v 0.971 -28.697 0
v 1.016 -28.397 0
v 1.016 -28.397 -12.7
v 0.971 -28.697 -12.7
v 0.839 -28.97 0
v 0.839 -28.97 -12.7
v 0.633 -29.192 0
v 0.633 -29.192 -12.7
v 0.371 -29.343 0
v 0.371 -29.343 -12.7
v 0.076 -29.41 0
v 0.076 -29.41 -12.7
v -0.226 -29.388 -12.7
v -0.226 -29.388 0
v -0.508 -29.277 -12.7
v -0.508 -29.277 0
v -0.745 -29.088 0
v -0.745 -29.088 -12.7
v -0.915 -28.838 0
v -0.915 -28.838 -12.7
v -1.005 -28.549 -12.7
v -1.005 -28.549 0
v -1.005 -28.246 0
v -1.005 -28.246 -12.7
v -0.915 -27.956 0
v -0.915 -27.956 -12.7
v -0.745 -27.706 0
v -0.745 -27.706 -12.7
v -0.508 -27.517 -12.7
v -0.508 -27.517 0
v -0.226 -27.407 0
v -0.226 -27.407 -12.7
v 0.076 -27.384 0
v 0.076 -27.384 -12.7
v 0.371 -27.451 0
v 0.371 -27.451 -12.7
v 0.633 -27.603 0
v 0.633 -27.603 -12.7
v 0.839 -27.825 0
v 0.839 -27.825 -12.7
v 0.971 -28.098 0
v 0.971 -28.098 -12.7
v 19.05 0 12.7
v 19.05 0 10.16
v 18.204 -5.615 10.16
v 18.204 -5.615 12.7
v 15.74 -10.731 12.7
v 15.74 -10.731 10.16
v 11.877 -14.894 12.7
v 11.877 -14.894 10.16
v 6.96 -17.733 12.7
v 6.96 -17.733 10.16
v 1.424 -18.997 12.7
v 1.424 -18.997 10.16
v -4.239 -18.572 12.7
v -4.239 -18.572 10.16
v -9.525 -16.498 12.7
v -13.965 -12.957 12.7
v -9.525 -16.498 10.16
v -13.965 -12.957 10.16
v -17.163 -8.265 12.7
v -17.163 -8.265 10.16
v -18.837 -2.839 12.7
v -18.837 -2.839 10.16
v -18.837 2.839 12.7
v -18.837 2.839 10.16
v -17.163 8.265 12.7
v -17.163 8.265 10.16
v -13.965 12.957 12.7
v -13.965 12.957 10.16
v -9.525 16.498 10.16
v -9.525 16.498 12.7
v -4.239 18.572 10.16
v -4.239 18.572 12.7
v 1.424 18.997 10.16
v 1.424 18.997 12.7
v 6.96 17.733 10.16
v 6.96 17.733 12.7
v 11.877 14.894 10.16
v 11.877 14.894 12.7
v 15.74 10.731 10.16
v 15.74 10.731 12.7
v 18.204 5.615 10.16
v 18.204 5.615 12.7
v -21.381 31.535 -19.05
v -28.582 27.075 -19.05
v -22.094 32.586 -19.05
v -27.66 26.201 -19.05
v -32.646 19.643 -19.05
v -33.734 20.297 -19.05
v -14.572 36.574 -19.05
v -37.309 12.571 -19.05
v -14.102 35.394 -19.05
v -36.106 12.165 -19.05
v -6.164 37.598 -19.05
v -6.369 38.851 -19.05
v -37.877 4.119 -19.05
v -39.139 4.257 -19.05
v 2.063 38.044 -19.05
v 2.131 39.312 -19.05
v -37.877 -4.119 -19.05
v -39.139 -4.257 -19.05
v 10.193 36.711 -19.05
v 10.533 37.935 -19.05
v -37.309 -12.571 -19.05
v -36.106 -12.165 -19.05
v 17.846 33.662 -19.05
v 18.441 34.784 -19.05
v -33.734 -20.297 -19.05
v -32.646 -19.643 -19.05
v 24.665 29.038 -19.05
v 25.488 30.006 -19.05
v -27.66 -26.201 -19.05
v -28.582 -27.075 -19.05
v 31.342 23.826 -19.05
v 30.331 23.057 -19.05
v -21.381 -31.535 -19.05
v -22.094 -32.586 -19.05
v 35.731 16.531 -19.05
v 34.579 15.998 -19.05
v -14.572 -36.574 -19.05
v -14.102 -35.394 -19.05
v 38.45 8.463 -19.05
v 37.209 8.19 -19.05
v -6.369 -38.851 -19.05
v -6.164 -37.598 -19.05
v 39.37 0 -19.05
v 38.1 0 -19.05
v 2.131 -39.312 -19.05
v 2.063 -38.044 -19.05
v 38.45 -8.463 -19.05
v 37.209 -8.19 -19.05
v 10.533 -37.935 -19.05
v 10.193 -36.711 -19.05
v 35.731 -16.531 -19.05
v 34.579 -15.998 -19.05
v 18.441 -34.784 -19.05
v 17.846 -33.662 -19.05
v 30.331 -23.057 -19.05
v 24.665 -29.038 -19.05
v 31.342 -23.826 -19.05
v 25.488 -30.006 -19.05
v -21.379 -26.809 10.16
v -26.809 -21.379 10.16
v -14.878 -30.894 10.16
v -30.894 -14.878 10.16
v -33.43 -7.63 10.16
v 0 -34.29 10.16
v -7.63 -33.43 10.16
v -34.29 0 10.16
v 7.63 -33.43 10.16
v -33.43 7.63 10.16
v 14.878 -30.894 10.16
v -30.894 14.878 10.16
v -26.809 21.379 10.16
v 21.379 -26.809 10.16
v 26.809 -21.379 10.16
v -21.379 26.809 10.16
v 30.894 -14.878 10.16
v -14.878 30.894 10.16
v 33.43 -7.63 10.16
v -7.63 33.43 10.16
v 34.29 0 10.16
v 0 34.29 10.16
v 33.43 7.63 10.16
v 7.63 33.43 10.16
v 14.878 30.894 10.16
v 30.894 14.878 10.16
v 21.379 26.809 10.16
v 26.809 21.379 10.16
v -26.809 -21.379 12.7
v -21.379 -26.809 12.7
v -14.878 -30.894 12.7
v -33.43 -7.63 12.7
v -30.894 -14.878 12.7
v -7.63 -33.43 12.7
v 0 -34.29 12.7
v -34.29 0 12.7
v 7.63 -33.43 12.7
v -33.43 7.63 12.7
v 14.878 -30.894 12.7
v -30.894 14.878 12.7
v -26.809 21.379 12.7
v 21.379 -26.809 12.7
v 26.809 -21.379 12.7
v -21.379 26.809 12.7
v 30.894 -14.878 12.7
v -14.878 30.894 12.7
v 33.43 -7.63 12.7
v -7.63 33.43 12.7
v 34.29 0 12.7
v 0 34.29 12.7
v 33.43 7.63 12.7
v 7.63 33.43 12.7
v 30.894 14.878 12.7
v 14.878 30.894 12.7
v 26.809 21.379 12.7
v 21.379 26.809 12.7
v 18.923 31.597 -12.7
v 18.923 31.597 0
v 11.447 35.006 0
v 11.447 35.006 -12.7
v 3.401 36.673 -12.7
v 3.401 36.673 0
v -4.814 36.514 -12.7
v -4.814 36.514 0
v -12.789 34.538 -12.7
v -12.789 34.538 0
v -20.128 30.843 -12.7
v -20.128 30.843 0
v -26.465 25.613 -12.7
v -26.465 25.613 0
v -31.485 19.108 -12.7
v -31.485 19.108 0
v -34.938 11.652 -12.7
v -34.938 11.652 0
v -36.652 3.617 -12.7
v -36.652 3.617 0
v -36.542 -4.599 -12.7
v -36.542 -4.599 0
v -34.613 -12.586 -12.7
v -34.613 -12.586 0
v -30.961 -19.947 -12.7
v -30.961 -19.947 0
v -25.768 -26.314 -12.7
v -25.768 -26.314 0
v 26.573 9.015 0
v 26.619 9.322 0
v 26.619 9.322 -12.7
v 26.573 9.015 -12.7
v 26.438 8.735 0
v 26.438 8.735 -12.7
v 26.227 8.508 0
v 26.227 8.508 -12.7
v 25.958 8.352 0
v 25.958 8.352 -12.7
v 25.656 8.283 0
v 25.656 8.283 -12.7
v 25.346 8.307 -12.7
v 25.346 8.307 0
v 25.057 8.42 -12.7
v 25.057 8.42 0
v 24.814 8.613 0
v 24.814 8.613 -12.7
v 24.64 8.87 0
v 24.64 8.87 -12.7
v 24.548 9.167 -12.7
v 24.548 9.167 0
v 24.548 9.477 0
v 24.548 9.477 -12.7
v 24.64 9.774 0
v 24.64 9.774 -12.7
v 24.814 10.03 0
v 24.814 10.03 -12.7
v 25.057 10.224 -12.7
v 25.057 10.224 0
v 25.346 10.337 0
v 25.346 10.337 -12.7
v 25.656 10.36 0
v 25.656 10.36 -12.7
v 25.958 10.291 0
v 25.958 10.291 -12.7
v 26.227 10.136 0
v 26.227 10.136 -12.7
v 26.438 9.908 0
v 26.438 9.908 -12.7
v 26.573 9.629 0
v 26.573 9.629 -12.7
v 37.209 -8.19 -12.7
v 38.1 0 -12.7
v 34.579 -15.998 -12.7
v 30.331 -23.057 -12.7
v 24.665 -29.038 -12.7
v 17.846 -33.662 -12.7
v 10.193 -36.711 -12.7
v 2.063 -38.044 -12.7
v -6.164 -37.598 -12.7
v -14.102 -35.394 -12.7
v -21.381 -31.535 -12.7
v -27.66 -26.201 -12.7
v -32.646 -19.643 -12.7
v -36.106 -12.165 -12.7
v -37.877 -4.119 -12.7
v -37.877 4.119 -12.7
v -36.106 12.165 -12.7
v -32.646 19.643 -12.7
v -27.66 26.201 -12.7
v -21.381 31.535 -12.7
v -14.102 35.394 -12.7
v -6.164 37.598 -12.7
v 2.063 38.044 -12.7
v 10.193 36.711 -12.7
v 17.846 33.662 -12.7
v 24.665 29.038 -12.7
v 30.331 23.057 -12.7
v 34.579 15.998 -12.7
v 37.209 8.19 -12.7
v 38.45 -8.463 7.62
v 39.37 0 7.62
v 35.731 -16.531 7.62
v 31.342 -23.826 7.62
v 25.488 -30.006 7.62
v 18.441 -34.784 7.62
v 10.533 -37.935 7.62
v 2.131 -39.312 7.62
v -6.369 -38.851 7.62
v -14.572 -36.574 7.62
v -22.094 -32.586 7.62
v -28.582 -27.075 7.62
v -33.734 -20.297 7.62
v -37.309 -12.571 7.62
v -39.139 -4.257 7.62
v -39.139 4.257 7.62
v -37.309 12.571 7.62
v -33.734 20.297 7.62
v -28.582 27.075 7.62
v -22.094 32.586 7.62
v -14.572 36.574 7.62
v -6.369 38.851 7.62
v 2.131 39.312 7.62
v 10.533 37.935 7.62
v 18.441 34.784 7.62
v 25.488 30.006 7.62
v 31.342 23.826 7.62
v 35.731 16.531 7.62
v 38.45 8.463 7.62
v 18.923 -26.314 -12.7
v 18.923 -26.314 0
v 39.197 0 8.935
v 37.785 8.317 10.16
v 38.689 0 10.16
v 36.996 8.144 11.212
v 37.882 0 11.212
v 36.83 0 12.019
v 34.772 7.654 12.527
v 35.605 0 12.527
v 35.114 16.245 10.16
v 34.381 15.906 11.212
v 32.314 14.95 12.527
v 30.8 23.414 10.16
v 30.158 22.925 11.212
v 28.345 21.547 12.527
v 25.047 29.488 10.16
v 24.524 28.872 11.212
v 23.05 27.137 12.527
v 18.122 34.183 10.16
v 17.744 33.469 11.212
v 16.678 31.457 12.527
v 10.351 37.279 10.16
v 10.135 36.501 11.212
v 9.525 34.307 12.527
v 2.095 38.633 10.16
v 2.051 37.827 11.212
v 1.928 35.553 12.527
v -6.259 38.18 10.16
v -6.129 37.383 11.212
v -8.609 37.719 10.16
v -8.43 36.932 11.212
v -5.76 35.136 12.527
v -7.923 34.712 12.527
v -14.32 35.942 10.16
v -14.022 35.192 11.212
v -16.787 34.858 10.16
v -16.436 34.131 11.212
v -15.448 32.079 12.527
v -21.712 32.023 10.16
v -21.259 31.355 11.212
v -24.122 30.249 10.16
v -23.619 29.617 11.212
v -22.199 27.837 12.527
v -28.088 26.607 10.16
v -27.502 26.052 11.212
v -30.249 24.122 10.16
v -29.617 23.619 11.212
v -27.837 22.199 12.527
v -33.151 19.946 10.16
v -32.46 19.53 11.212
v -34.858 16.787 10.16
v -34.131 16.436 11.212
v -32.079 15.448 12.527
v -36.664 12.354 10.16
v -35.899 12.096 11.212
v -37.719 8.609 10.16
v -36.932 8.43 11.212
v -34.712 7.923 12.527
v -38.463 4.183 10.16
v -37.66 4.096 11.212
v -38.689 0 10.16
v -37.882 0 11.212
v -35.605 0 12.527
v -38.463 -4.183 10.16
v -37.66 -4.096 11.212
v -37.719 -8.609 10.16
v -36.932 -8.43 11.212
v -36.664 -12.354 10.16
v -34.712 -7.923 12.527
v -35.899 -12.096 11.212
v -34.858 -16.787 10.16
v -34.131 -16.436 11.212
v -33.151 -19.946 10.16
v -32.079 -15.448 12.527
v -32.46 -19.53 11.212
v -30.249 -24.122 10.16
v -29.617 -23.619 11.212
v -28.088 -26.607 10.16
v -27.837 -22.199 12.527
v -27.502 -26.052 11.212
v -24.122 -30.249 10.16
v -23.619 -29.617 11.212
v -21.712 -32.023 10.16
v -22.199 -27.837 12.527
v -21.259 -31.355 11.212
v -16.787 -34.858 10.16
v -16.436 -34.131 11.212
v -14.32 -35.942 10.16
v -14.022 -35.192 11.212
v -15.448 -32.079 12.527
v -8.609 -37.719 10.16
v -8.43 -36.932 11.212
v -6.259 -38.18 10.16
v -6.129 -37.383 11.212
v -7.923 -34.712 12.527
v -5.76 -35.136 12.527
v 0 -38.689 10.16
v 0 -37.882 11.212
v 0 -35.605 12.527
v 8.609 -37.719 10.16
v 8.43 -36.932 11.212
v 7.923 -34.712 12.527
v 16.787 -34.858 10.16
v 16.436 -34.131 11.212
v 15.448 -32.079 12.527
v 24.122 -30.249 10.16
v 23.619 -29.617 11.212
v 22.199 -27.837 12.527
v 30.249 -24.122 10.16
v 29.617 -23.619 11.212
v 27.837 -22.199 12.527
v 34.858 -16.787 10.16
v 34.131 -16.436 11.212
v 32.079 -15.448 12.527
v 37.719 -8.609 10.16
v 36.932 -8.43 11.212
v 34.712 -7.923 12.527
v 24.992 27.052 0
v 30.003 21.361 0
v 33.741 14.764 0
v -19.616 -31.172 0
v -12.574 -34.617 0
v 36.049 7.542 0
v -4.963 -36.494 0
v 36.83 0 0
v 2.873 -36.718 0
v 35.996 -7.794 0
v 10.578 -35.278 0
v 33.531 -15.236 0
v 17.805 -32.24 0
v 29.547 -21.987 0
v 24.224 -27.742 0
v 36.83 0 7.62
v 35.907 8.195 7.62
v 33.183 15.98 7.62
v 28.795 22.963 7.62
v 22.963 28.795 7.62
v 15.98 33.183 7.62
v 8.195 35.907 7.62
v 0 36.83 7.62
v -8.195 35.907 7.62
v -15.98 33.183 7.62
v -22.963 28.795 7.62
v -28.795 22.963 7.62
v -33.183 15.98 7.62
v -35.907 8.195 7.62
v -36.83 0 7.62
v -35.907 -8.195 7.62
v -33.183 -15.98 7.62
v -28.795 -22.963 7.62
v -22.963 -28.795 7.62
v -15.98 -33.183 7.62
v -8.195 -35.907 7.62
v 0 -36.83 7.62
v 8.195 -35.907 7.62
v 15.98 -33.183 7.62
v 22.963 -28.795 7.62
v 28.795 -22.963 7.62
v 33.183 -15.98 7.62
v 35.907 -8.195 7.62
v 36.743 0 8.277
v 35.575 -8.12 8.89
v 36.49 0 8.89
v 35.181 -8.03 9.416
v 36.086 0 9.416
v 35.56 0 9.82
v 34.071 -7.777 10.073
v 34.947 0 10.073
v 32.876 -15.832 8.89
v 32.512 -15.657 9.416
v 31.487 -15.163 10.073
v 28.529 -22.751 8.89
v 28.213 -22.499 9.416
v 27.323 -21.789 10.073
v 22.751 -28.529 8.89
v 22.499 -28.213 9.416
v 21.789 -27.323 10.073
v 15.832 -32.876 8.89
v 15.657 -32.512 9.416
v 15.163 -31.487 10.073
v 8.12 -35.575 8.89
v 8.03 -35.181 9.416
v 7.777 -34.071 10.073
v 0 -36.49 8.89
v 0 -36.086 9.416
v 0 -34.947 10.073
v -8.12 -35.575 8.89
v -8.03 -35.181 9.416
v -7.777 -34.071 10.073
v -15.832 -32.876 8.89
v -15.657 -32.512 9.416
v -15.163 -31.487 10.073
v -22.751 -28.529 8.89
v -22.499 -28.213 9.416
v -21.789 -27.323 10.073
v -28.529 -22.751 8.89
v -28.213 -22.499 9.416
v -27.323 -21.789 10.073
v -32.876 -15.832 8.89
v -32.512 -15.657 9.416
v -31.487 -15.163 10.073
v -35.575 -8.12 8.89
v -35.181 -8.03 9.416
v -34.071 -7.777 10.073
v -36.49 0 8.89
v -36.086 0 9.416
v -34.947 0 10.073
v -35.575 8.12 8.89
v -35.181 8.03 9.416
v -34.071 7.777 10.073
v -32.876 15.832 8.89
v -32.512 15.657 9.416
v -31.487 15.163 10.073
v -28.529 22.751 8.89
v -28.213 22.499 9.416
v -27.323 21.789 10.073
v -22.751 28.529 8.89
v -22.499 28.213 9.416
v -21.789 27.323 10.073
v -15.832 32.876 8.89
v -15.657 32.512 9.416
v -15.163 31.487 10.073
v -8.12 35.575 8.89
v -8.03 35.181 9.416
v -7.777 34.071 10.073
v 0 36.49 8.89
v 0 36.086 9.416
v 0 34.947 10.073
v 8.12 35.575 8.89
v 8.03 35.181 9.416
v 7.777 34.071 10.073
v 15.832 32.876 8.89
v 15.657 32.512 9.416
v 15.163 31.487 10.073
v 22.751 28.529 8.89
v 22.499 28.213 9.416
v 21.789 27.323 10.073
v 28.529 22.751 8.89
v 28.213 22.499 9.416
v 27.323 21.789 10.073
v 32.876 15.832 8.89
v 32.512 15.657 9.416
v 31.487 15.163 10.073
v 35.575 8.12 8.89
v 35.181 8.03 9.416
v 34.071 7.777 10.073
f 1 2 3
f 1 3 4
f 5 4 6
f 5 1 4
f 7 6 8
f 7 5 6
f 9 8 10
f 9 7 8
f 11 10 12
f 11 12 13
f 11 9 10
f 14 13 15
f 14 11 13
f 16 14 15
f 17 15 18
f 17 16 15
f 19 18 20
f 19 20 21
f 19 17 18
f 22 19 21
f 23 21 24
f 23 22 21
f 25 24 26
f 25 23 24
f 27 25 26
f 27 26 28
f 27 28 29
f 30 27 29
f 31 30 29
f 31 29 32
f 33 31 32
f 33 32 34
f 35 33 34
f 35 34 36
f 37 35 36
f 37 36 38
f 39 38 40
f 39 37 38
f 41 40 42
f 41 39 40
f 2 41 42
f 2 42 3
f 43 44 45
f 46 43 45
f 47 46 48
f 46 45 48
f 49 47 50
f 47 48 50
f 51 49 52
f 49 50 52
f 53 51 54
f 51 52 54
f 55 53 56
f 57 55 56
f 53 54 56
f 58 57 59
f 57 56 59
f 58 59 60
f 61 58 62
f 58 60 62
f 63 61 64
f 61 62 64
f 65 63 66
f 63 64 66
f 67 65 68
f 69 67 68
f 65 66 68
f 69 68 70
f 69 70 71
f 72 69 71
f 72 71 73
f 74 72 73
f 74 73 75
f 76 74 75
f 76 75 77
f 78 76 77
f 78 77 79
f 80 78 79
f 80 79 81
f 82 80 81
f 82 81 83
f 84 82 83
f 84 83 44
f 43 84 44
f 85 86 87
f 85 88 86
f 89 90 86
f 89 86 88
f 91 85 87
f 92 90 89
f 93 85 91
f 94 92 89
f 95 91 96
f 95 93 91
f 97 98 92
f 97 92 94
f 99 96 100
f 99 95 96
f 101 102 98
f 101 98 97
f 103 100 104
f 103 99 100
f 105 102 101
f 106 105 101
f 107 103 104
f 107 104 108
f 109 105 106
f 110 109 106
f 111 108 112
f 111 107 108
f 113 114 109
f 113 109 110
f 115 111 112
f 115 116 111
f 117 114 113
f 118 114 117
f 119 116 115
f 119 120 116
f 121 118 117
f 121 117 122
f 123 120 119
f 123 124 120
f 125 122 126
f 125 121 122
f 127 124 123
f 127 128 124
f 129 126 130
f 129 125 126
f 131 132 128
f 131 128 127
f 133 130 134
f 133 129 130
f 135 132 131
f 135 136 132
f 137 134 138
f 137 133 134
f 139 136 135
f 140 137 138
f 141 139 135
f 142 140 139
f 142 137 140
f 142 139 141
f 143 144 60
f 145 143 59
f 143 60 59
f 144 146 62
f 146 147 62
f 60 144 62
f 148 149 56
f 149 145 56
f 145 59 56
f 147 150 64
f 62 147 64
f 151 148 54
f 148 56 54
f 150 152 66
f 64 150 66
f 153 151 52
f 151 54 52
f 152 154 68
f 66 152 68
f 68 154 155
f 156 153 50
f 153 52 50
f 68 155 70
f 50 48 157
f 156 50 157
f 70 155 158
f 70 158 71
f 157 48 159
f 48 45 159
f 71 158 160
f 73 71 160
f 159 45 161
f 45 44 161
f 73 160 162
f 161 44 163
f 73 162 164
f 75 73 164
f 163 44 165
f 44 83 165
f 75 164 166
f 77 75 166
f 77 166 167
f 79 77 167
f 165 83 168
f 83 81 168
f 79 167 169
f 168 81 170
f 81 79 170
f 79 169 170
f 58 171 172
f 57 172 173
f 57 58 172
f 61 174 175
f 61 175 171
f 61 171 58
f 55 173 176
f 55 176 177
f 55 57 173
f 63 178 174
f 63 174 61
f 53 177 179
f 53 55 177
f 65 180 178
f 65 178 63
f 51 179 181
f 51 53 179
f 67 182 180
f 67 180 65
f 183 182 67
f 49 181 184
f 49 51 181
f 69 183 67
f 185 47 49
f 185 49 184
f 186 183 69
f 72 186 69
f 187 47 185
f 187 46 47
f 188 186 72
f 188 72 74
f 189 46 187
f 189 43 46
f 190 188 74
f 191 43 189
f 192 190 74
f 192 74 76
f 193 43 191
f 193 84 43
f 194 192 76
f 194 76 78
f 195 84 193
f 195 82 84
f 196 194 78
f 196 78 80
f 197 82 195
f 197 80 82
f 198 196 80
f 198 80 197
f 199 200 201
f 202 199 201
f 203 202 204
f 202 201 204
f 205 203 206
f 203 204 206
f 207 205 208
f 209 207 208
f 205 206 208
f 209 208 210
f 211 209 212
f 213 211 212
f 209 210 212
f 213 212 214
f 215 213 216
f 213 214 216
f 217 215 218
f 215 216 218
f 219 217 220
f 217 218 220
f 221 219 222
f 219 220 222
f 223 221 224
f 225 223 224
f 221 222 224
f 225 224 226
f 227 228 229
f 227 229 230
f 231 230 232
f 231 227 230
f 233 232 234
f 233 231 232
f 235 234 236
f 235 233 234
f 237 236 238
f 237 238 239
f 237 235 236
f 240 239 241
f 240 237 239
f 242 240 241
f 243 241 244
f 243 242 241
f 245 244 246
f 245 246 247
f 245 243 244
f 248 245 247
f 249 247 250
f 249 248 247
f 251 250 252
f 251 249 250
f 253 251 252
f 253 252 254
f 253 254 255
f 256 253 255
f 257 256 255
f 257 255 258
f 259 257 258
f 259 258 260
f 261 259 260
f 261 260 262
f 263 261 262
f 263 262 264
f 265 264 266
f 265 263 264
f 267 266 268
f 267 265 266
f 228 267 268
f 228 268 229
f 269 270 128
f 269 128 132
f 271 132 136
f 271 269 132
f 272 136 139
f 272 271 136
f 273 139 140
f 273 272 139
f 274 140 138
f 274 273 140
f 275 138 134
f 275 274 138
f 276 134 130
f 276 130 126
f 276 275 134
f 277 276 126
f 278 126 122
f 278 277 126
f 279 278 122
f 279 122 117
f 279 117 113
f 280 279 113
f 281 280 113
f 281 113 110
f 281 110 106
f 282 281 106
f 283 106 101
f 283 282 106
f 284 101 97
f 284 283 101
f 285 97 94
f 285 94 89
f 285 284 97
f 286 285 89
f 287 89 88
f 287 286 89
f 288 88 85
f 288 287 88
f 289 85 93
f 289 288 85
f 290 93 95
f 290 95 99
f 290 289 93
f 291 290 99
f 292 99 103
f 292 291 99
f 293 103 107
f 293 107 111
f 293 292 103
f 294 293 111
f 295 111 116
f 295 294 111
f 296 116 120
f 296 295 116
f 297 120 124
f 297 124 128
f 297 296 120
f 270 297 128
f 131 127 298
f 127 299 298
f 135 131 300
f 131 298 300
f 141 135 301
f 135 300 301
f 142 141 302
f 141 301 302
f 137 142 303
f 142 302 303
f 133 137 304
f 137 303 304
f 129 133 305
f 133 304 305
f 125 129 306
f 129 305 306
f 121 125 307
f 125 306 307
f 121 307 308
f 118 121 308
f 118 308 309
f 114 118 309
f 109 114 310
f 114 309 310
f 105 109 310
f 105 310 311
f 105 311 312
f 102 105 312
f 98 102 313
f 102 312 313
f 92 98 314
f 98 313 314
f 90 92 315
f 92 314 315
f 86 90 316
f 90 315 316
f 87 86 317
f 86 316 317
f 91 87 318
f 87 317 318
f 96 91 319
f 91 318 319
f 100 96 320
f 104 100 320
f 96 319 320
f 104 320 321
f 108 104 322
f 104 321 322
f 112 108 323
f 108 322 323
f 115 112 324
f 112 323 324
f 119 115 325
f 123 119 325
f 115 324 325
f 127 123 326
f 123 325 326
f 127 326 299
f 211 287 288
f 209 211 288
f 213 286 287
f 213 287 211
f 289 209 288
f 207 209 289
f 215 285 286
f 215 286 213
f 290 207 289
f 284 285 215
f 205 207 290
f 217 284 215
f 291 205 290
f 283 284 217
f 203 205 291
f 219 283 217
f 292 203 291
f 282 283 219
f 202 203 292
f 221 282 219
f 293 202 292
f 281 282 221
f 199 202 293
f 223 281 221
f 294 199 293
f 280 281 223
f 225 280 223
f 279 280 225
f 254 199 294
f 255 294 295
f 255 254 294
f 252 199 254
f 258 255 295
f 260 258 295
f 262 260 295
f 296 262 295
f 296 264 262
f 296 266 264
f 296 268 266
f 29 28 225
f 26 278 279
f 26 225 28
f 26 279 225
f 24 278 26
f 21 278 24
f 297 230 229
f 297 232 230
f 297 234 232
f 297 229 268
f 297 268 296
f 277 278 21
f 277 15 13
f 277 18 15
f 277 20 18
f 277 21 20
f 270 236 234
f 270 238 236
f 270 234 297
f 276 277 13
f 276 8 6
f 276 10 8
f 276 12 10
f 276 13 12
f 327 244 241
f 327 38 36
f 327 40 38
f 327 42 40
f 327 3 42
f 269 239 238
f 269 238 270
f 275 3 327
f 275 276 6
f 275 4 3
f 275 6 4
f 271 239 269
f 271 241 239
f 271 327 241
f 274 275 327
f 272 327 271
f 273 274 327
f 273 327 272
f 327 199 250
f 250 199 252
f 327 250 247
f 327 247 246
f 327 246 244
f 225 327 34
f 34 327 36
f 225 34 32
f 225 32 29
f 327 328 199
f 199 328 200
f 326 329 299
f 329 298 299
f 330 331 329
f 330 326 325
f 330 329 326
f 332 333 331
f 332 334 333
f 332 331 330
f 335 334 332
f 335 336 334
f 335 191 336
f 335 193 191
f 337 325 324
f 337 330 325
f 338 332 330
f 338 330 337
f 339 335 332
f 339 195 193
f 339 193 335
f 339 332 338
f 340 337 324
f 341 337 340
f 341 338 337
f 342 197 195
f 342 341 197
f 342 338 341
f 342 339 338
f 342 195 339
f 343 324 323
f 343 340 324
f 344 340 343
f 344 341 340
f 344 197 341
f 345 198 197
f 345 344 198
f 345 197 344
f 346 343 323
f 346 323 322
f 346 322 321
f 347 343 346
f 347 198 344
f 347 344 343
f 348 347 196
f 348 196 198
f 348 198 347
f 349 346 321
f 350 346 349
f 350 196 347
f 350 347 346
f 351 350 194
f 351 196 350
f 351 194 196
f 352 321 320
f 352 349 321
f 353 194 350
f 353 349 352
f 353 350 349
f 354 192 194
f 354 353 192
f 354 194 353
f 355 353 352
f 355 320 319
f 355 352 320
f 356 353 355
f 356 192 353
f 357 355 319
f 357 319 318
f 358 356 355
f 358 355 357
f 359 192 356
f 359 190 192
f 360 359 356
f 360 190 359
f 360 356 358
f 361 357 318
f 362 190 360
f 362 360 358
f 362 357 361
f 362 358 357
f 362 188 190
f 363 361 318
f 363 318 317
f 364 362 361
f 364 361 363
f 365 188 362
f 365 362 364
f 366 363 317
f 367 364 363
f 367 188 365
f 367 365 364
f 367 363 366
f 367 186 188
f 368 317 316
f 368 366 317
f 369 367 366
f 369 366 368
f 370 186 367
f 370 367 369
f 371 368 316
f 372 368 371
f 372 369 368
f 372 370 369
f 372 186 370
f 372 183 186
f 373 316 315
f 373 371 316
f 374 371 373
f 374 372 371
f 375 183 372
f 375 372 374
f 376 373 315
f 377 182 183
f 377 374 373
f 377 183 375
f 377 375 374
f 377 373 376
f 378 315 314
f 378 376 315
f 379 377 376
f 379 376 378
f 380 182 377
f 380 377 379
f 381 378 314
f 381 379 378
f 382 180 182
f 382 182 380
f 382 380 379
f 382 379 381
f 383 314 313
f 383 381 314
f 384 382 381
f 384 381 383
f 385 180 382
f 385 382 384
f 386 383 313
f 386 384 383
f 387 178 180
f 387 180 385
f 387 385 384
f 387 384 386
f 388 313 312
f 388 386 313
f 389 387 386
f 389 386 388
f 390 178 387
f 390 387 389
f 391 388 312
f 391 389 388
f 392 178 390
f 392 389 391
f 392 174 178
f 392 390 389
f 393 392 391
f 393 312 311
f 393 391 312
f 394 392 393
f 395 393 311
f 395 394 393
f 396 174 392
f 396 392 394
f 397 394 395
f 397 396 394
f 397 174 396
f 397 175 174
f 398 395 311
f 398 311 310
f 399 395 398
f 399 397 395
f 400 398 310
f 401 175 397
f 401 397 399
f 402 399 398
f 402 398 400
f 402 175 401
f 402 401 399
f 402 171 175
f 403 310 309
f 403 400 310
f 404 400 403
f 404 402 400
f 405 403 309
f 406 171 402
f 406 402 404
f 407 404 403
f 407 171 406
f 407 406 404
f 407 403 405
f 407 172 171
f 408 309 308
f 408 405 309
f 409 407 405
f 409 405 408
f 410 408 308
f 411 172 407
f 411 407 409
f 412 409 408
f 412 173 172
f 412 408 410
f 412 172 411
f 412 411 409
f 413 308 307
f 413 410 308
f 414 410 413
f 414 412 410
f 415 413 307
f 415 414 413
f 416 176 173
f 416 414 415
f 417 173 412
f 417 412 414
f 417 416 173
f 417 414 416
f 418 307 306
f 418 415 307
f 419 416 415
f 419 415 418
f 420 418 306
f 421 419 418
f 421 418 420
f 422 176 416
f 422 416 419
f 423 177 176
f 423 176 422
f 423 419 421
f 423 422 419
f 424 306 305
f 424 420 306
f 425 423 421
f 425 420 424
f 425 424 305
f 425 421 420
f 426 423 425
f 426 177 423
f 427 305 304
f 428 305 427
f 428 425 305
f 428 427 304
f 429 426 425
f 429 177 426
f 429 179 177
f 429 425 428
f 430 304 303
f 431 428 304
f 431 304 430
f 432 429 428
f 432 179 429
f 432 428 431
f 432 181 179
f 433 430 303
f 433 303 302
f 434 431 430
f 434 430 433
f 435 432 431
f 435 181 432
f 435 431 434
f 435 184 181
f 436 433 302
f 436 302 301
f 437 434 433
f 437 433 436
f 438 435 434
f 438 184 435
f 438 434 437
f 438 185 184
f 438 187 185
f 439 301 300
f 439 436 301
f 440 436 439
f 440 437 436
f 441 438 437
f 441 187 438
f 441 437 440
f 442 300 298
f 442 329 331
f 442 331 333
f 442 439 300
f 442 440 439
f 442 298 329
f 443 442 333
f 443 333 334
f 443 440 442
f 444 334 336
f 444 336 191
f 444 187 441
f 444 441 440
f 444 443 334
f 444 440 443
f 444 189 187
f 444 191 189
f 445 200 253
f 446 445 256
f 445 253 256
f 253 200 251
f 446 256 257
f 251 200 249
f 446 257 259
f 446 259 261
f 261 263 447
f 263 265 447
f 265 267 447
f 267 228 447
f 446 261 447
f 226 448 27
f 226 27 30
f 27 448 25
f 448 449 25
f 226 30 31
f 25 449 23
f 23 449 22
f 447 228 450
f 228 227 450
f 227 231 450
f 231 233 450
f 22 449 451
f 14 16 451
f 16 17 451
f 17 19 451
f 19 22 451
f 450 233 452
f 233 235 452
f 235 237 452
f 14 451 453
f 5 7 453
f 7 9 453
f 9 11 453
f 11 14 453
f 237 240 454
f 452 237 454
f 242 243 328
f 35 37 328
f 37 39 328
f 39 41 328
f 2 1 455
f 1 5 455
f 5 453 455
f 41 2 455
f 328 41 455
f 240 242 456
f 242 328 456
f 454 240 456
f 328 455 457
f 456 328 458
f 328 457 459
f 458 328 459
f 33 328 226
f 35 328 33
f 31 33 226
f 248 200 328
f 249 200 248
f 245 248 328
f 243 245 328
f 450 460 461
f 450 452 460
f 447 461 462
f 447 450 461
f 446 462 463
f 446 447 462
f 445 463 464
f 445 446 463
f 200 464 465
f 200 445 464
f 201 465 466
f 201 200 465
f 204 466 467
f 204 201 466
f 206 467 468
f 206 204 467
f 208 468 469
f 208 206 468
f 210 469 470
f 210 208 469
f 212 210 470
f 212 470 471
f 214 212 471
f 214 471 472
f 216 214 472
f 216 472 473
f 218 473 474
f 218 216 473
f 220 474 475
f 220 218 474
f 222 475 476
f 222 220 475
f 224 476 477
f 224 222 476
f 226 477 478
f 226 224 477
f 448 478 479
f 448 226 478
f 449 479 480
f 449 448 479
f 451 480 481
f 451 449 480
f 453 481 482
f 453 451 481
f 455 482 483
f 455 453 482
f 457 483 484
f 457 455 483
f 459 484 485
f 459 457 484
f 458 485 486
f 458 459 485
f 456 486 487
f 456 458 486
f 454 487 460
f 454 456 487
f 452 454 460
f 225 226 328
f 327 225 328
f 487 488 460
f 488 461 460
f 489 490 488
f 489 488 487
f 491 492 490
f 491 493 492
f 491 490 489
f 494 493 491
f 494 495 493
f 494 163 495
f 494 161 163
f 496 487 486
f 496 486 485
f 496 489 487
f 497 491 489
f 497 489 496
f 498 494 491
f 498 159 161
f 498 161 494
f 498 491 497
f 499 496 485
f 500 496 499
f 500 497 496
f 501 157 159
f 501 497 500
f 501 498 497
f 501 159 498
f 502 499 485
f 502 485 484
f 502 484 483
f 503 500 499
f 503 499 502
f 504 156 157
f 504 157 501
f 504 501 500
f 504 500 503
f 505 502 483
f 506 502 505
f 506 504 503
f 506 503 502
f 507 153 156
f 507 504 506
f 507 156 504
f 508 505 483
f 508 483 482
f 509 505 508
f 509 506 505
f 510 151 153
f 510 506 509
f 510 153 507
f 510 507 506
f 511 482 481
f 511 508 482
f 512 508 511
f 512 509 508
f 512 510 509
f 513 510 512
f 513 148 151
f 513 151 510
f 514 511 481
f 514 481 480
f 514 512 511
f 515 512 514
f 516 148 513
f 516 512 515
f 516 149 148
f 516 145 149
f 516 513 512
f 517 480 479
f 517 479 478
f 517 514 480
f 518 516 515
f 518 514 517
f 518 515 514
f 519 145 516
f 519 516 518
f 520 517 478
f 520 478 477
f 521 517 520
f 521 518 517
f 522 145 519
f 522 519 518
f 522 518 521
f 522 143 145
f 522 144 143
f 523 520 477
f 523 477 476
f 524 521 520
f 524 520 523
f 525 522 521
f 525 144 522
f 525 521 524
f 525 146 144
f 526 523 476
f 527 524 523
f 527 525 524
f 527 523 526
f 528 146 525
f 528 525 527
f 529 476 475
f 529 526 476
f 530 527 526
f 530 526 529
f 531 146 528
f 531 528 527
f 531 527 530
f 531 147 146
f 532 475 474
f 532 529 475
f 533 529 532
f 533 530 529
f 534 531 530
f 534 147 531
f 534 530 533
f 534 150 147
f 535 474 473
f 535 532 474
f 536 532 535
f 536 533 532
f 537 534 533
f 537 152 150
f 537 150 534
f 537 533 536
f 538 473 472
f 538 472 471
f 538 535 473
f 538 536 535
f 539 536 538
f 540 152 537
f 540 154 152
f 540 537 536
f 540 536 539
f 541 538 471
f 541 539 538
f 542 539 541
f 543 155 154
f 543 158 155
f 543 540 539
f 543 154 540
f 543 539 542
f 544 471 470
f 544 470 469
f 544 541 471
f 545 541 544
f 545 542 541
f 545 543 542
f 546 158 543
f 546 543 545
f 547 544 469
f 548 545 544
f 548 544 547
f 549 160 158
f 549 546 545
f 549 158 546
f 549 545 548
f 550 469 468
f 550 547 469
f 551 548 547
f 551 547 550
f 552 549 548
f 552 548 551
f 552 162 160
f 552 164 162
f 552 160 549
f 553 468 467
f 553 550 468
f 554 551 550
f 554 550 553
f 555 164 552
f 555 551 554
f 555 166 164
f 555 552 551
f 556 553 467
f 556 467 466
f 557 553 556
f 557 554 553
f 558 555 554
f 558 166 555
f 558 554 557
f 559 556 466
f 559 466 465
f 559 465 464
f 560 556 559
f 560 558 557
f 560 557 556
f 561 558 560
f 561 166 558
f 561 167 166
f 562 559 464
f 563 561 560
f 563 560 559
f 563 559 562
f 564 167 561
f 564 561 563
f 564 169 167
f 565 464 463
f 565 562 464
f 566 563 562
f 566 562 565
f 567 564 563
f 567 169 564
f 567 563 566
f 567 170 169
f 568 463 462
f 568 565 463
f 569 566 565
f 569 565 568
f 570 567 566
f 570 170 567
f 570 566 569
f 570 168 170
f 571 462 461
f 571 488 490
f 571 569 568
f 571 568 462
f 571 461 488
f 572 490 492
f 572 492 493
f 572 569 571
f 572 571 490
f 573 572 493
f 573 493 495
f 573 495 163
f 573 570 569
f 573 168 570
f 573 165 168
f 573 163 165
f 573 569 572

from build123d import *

# Parameters (mm, degrees)
F0_R      = 39.37
F1_DEPTH  = 12.7
F2_T      = -2.54
F3_R      = 5.08
F4_R      = 2.54
F5_R      = 19.05
F6_DEPTH  = 25.4
F7_R      = 39.37
F7_R_2    = 1.0414
F7_R_3    = 1.016
F8_DEPTH  = 12.7
F9_R      = 39.37
F9_R_2    = 38.1
F10_DEPTH = 6.35


with BuildPart() as f1:
    # F0 (on Top) → F1 (new body)
    with BuildSketch(Plane.XY):
        Circle(F0_R)
    extrude(amount=F1_DEPTH)

    # F2
    f2_openings = [f1.faces().sort_by_distance(p)[0] for p in [
        (0, 0, 0),
    ]]
    offset(amount=F2_T, openings=f2_openings)

    # F3
    f3_edges = [f1.edges().sort_by_distance(p)[0] for p in [
        (-39.37, 0, 12.7),
    ]]
    fillet(f3_edges, radius=F3_R)

    # F4
    f4_edges = [f1.edges().sort_by_distance(p)[0] for p in [
        (-36.83, 0, 10.16),
    ]]
    fillet(f4_edges, radius=F4_R)

    # F5 (on face) → F6 (cut)
    with BuildSketch(Plane(origin=(0, 0, 10.16), x_dir=(1, 0, 0), z_dir=(0, 0, -1))):
        Circle(F5_R)
    extrude(amount=-F6_DEPTH, mode=Mode.SUBTRACT)

    # F7 (on face) → F8 (join)
    with BuildSketch(Plane(origin=(0, 0, 0), x_dir=(1, 0, 0), z_dir=(0, 0, -1))):
        Circle(F7_R)
        with BuildLine():
            ThreePointArc((18.923, -31.5969772447), (-29.1572661412, -22.5011717733), (-25.7682217594, 26.3144))
            Line((-25.7682217594, 26.3144), (18.923, 26.3144))
            Line((18.923, 26.3144), (18.923, -31.5969772447))
        make_face(mode=Mode.SUBTRACT)
        with Locations((25.5778, -9.3218)):
            Circle(F7_R_2, mode=Mode.SUBTRACT)
        with Locations((0, 28.3972)):
            Circle(F7_R_3, mode=Mode.SUBTRACT)
    extrude(amount=F8_DEPTH)

    # F9 (on face) → F10 (join)
    with BuildSketch(Plane(origin=(0, 0, -12.7), x_dir=(1, 0, 0), z_dir=(0, 0, -1))):
        Circle(F9_R)
        Circle(F9_R_2, mode=Mode.SUBTRACT)
    extrude(amount=F10_DEPTH)


solid = f1.part
